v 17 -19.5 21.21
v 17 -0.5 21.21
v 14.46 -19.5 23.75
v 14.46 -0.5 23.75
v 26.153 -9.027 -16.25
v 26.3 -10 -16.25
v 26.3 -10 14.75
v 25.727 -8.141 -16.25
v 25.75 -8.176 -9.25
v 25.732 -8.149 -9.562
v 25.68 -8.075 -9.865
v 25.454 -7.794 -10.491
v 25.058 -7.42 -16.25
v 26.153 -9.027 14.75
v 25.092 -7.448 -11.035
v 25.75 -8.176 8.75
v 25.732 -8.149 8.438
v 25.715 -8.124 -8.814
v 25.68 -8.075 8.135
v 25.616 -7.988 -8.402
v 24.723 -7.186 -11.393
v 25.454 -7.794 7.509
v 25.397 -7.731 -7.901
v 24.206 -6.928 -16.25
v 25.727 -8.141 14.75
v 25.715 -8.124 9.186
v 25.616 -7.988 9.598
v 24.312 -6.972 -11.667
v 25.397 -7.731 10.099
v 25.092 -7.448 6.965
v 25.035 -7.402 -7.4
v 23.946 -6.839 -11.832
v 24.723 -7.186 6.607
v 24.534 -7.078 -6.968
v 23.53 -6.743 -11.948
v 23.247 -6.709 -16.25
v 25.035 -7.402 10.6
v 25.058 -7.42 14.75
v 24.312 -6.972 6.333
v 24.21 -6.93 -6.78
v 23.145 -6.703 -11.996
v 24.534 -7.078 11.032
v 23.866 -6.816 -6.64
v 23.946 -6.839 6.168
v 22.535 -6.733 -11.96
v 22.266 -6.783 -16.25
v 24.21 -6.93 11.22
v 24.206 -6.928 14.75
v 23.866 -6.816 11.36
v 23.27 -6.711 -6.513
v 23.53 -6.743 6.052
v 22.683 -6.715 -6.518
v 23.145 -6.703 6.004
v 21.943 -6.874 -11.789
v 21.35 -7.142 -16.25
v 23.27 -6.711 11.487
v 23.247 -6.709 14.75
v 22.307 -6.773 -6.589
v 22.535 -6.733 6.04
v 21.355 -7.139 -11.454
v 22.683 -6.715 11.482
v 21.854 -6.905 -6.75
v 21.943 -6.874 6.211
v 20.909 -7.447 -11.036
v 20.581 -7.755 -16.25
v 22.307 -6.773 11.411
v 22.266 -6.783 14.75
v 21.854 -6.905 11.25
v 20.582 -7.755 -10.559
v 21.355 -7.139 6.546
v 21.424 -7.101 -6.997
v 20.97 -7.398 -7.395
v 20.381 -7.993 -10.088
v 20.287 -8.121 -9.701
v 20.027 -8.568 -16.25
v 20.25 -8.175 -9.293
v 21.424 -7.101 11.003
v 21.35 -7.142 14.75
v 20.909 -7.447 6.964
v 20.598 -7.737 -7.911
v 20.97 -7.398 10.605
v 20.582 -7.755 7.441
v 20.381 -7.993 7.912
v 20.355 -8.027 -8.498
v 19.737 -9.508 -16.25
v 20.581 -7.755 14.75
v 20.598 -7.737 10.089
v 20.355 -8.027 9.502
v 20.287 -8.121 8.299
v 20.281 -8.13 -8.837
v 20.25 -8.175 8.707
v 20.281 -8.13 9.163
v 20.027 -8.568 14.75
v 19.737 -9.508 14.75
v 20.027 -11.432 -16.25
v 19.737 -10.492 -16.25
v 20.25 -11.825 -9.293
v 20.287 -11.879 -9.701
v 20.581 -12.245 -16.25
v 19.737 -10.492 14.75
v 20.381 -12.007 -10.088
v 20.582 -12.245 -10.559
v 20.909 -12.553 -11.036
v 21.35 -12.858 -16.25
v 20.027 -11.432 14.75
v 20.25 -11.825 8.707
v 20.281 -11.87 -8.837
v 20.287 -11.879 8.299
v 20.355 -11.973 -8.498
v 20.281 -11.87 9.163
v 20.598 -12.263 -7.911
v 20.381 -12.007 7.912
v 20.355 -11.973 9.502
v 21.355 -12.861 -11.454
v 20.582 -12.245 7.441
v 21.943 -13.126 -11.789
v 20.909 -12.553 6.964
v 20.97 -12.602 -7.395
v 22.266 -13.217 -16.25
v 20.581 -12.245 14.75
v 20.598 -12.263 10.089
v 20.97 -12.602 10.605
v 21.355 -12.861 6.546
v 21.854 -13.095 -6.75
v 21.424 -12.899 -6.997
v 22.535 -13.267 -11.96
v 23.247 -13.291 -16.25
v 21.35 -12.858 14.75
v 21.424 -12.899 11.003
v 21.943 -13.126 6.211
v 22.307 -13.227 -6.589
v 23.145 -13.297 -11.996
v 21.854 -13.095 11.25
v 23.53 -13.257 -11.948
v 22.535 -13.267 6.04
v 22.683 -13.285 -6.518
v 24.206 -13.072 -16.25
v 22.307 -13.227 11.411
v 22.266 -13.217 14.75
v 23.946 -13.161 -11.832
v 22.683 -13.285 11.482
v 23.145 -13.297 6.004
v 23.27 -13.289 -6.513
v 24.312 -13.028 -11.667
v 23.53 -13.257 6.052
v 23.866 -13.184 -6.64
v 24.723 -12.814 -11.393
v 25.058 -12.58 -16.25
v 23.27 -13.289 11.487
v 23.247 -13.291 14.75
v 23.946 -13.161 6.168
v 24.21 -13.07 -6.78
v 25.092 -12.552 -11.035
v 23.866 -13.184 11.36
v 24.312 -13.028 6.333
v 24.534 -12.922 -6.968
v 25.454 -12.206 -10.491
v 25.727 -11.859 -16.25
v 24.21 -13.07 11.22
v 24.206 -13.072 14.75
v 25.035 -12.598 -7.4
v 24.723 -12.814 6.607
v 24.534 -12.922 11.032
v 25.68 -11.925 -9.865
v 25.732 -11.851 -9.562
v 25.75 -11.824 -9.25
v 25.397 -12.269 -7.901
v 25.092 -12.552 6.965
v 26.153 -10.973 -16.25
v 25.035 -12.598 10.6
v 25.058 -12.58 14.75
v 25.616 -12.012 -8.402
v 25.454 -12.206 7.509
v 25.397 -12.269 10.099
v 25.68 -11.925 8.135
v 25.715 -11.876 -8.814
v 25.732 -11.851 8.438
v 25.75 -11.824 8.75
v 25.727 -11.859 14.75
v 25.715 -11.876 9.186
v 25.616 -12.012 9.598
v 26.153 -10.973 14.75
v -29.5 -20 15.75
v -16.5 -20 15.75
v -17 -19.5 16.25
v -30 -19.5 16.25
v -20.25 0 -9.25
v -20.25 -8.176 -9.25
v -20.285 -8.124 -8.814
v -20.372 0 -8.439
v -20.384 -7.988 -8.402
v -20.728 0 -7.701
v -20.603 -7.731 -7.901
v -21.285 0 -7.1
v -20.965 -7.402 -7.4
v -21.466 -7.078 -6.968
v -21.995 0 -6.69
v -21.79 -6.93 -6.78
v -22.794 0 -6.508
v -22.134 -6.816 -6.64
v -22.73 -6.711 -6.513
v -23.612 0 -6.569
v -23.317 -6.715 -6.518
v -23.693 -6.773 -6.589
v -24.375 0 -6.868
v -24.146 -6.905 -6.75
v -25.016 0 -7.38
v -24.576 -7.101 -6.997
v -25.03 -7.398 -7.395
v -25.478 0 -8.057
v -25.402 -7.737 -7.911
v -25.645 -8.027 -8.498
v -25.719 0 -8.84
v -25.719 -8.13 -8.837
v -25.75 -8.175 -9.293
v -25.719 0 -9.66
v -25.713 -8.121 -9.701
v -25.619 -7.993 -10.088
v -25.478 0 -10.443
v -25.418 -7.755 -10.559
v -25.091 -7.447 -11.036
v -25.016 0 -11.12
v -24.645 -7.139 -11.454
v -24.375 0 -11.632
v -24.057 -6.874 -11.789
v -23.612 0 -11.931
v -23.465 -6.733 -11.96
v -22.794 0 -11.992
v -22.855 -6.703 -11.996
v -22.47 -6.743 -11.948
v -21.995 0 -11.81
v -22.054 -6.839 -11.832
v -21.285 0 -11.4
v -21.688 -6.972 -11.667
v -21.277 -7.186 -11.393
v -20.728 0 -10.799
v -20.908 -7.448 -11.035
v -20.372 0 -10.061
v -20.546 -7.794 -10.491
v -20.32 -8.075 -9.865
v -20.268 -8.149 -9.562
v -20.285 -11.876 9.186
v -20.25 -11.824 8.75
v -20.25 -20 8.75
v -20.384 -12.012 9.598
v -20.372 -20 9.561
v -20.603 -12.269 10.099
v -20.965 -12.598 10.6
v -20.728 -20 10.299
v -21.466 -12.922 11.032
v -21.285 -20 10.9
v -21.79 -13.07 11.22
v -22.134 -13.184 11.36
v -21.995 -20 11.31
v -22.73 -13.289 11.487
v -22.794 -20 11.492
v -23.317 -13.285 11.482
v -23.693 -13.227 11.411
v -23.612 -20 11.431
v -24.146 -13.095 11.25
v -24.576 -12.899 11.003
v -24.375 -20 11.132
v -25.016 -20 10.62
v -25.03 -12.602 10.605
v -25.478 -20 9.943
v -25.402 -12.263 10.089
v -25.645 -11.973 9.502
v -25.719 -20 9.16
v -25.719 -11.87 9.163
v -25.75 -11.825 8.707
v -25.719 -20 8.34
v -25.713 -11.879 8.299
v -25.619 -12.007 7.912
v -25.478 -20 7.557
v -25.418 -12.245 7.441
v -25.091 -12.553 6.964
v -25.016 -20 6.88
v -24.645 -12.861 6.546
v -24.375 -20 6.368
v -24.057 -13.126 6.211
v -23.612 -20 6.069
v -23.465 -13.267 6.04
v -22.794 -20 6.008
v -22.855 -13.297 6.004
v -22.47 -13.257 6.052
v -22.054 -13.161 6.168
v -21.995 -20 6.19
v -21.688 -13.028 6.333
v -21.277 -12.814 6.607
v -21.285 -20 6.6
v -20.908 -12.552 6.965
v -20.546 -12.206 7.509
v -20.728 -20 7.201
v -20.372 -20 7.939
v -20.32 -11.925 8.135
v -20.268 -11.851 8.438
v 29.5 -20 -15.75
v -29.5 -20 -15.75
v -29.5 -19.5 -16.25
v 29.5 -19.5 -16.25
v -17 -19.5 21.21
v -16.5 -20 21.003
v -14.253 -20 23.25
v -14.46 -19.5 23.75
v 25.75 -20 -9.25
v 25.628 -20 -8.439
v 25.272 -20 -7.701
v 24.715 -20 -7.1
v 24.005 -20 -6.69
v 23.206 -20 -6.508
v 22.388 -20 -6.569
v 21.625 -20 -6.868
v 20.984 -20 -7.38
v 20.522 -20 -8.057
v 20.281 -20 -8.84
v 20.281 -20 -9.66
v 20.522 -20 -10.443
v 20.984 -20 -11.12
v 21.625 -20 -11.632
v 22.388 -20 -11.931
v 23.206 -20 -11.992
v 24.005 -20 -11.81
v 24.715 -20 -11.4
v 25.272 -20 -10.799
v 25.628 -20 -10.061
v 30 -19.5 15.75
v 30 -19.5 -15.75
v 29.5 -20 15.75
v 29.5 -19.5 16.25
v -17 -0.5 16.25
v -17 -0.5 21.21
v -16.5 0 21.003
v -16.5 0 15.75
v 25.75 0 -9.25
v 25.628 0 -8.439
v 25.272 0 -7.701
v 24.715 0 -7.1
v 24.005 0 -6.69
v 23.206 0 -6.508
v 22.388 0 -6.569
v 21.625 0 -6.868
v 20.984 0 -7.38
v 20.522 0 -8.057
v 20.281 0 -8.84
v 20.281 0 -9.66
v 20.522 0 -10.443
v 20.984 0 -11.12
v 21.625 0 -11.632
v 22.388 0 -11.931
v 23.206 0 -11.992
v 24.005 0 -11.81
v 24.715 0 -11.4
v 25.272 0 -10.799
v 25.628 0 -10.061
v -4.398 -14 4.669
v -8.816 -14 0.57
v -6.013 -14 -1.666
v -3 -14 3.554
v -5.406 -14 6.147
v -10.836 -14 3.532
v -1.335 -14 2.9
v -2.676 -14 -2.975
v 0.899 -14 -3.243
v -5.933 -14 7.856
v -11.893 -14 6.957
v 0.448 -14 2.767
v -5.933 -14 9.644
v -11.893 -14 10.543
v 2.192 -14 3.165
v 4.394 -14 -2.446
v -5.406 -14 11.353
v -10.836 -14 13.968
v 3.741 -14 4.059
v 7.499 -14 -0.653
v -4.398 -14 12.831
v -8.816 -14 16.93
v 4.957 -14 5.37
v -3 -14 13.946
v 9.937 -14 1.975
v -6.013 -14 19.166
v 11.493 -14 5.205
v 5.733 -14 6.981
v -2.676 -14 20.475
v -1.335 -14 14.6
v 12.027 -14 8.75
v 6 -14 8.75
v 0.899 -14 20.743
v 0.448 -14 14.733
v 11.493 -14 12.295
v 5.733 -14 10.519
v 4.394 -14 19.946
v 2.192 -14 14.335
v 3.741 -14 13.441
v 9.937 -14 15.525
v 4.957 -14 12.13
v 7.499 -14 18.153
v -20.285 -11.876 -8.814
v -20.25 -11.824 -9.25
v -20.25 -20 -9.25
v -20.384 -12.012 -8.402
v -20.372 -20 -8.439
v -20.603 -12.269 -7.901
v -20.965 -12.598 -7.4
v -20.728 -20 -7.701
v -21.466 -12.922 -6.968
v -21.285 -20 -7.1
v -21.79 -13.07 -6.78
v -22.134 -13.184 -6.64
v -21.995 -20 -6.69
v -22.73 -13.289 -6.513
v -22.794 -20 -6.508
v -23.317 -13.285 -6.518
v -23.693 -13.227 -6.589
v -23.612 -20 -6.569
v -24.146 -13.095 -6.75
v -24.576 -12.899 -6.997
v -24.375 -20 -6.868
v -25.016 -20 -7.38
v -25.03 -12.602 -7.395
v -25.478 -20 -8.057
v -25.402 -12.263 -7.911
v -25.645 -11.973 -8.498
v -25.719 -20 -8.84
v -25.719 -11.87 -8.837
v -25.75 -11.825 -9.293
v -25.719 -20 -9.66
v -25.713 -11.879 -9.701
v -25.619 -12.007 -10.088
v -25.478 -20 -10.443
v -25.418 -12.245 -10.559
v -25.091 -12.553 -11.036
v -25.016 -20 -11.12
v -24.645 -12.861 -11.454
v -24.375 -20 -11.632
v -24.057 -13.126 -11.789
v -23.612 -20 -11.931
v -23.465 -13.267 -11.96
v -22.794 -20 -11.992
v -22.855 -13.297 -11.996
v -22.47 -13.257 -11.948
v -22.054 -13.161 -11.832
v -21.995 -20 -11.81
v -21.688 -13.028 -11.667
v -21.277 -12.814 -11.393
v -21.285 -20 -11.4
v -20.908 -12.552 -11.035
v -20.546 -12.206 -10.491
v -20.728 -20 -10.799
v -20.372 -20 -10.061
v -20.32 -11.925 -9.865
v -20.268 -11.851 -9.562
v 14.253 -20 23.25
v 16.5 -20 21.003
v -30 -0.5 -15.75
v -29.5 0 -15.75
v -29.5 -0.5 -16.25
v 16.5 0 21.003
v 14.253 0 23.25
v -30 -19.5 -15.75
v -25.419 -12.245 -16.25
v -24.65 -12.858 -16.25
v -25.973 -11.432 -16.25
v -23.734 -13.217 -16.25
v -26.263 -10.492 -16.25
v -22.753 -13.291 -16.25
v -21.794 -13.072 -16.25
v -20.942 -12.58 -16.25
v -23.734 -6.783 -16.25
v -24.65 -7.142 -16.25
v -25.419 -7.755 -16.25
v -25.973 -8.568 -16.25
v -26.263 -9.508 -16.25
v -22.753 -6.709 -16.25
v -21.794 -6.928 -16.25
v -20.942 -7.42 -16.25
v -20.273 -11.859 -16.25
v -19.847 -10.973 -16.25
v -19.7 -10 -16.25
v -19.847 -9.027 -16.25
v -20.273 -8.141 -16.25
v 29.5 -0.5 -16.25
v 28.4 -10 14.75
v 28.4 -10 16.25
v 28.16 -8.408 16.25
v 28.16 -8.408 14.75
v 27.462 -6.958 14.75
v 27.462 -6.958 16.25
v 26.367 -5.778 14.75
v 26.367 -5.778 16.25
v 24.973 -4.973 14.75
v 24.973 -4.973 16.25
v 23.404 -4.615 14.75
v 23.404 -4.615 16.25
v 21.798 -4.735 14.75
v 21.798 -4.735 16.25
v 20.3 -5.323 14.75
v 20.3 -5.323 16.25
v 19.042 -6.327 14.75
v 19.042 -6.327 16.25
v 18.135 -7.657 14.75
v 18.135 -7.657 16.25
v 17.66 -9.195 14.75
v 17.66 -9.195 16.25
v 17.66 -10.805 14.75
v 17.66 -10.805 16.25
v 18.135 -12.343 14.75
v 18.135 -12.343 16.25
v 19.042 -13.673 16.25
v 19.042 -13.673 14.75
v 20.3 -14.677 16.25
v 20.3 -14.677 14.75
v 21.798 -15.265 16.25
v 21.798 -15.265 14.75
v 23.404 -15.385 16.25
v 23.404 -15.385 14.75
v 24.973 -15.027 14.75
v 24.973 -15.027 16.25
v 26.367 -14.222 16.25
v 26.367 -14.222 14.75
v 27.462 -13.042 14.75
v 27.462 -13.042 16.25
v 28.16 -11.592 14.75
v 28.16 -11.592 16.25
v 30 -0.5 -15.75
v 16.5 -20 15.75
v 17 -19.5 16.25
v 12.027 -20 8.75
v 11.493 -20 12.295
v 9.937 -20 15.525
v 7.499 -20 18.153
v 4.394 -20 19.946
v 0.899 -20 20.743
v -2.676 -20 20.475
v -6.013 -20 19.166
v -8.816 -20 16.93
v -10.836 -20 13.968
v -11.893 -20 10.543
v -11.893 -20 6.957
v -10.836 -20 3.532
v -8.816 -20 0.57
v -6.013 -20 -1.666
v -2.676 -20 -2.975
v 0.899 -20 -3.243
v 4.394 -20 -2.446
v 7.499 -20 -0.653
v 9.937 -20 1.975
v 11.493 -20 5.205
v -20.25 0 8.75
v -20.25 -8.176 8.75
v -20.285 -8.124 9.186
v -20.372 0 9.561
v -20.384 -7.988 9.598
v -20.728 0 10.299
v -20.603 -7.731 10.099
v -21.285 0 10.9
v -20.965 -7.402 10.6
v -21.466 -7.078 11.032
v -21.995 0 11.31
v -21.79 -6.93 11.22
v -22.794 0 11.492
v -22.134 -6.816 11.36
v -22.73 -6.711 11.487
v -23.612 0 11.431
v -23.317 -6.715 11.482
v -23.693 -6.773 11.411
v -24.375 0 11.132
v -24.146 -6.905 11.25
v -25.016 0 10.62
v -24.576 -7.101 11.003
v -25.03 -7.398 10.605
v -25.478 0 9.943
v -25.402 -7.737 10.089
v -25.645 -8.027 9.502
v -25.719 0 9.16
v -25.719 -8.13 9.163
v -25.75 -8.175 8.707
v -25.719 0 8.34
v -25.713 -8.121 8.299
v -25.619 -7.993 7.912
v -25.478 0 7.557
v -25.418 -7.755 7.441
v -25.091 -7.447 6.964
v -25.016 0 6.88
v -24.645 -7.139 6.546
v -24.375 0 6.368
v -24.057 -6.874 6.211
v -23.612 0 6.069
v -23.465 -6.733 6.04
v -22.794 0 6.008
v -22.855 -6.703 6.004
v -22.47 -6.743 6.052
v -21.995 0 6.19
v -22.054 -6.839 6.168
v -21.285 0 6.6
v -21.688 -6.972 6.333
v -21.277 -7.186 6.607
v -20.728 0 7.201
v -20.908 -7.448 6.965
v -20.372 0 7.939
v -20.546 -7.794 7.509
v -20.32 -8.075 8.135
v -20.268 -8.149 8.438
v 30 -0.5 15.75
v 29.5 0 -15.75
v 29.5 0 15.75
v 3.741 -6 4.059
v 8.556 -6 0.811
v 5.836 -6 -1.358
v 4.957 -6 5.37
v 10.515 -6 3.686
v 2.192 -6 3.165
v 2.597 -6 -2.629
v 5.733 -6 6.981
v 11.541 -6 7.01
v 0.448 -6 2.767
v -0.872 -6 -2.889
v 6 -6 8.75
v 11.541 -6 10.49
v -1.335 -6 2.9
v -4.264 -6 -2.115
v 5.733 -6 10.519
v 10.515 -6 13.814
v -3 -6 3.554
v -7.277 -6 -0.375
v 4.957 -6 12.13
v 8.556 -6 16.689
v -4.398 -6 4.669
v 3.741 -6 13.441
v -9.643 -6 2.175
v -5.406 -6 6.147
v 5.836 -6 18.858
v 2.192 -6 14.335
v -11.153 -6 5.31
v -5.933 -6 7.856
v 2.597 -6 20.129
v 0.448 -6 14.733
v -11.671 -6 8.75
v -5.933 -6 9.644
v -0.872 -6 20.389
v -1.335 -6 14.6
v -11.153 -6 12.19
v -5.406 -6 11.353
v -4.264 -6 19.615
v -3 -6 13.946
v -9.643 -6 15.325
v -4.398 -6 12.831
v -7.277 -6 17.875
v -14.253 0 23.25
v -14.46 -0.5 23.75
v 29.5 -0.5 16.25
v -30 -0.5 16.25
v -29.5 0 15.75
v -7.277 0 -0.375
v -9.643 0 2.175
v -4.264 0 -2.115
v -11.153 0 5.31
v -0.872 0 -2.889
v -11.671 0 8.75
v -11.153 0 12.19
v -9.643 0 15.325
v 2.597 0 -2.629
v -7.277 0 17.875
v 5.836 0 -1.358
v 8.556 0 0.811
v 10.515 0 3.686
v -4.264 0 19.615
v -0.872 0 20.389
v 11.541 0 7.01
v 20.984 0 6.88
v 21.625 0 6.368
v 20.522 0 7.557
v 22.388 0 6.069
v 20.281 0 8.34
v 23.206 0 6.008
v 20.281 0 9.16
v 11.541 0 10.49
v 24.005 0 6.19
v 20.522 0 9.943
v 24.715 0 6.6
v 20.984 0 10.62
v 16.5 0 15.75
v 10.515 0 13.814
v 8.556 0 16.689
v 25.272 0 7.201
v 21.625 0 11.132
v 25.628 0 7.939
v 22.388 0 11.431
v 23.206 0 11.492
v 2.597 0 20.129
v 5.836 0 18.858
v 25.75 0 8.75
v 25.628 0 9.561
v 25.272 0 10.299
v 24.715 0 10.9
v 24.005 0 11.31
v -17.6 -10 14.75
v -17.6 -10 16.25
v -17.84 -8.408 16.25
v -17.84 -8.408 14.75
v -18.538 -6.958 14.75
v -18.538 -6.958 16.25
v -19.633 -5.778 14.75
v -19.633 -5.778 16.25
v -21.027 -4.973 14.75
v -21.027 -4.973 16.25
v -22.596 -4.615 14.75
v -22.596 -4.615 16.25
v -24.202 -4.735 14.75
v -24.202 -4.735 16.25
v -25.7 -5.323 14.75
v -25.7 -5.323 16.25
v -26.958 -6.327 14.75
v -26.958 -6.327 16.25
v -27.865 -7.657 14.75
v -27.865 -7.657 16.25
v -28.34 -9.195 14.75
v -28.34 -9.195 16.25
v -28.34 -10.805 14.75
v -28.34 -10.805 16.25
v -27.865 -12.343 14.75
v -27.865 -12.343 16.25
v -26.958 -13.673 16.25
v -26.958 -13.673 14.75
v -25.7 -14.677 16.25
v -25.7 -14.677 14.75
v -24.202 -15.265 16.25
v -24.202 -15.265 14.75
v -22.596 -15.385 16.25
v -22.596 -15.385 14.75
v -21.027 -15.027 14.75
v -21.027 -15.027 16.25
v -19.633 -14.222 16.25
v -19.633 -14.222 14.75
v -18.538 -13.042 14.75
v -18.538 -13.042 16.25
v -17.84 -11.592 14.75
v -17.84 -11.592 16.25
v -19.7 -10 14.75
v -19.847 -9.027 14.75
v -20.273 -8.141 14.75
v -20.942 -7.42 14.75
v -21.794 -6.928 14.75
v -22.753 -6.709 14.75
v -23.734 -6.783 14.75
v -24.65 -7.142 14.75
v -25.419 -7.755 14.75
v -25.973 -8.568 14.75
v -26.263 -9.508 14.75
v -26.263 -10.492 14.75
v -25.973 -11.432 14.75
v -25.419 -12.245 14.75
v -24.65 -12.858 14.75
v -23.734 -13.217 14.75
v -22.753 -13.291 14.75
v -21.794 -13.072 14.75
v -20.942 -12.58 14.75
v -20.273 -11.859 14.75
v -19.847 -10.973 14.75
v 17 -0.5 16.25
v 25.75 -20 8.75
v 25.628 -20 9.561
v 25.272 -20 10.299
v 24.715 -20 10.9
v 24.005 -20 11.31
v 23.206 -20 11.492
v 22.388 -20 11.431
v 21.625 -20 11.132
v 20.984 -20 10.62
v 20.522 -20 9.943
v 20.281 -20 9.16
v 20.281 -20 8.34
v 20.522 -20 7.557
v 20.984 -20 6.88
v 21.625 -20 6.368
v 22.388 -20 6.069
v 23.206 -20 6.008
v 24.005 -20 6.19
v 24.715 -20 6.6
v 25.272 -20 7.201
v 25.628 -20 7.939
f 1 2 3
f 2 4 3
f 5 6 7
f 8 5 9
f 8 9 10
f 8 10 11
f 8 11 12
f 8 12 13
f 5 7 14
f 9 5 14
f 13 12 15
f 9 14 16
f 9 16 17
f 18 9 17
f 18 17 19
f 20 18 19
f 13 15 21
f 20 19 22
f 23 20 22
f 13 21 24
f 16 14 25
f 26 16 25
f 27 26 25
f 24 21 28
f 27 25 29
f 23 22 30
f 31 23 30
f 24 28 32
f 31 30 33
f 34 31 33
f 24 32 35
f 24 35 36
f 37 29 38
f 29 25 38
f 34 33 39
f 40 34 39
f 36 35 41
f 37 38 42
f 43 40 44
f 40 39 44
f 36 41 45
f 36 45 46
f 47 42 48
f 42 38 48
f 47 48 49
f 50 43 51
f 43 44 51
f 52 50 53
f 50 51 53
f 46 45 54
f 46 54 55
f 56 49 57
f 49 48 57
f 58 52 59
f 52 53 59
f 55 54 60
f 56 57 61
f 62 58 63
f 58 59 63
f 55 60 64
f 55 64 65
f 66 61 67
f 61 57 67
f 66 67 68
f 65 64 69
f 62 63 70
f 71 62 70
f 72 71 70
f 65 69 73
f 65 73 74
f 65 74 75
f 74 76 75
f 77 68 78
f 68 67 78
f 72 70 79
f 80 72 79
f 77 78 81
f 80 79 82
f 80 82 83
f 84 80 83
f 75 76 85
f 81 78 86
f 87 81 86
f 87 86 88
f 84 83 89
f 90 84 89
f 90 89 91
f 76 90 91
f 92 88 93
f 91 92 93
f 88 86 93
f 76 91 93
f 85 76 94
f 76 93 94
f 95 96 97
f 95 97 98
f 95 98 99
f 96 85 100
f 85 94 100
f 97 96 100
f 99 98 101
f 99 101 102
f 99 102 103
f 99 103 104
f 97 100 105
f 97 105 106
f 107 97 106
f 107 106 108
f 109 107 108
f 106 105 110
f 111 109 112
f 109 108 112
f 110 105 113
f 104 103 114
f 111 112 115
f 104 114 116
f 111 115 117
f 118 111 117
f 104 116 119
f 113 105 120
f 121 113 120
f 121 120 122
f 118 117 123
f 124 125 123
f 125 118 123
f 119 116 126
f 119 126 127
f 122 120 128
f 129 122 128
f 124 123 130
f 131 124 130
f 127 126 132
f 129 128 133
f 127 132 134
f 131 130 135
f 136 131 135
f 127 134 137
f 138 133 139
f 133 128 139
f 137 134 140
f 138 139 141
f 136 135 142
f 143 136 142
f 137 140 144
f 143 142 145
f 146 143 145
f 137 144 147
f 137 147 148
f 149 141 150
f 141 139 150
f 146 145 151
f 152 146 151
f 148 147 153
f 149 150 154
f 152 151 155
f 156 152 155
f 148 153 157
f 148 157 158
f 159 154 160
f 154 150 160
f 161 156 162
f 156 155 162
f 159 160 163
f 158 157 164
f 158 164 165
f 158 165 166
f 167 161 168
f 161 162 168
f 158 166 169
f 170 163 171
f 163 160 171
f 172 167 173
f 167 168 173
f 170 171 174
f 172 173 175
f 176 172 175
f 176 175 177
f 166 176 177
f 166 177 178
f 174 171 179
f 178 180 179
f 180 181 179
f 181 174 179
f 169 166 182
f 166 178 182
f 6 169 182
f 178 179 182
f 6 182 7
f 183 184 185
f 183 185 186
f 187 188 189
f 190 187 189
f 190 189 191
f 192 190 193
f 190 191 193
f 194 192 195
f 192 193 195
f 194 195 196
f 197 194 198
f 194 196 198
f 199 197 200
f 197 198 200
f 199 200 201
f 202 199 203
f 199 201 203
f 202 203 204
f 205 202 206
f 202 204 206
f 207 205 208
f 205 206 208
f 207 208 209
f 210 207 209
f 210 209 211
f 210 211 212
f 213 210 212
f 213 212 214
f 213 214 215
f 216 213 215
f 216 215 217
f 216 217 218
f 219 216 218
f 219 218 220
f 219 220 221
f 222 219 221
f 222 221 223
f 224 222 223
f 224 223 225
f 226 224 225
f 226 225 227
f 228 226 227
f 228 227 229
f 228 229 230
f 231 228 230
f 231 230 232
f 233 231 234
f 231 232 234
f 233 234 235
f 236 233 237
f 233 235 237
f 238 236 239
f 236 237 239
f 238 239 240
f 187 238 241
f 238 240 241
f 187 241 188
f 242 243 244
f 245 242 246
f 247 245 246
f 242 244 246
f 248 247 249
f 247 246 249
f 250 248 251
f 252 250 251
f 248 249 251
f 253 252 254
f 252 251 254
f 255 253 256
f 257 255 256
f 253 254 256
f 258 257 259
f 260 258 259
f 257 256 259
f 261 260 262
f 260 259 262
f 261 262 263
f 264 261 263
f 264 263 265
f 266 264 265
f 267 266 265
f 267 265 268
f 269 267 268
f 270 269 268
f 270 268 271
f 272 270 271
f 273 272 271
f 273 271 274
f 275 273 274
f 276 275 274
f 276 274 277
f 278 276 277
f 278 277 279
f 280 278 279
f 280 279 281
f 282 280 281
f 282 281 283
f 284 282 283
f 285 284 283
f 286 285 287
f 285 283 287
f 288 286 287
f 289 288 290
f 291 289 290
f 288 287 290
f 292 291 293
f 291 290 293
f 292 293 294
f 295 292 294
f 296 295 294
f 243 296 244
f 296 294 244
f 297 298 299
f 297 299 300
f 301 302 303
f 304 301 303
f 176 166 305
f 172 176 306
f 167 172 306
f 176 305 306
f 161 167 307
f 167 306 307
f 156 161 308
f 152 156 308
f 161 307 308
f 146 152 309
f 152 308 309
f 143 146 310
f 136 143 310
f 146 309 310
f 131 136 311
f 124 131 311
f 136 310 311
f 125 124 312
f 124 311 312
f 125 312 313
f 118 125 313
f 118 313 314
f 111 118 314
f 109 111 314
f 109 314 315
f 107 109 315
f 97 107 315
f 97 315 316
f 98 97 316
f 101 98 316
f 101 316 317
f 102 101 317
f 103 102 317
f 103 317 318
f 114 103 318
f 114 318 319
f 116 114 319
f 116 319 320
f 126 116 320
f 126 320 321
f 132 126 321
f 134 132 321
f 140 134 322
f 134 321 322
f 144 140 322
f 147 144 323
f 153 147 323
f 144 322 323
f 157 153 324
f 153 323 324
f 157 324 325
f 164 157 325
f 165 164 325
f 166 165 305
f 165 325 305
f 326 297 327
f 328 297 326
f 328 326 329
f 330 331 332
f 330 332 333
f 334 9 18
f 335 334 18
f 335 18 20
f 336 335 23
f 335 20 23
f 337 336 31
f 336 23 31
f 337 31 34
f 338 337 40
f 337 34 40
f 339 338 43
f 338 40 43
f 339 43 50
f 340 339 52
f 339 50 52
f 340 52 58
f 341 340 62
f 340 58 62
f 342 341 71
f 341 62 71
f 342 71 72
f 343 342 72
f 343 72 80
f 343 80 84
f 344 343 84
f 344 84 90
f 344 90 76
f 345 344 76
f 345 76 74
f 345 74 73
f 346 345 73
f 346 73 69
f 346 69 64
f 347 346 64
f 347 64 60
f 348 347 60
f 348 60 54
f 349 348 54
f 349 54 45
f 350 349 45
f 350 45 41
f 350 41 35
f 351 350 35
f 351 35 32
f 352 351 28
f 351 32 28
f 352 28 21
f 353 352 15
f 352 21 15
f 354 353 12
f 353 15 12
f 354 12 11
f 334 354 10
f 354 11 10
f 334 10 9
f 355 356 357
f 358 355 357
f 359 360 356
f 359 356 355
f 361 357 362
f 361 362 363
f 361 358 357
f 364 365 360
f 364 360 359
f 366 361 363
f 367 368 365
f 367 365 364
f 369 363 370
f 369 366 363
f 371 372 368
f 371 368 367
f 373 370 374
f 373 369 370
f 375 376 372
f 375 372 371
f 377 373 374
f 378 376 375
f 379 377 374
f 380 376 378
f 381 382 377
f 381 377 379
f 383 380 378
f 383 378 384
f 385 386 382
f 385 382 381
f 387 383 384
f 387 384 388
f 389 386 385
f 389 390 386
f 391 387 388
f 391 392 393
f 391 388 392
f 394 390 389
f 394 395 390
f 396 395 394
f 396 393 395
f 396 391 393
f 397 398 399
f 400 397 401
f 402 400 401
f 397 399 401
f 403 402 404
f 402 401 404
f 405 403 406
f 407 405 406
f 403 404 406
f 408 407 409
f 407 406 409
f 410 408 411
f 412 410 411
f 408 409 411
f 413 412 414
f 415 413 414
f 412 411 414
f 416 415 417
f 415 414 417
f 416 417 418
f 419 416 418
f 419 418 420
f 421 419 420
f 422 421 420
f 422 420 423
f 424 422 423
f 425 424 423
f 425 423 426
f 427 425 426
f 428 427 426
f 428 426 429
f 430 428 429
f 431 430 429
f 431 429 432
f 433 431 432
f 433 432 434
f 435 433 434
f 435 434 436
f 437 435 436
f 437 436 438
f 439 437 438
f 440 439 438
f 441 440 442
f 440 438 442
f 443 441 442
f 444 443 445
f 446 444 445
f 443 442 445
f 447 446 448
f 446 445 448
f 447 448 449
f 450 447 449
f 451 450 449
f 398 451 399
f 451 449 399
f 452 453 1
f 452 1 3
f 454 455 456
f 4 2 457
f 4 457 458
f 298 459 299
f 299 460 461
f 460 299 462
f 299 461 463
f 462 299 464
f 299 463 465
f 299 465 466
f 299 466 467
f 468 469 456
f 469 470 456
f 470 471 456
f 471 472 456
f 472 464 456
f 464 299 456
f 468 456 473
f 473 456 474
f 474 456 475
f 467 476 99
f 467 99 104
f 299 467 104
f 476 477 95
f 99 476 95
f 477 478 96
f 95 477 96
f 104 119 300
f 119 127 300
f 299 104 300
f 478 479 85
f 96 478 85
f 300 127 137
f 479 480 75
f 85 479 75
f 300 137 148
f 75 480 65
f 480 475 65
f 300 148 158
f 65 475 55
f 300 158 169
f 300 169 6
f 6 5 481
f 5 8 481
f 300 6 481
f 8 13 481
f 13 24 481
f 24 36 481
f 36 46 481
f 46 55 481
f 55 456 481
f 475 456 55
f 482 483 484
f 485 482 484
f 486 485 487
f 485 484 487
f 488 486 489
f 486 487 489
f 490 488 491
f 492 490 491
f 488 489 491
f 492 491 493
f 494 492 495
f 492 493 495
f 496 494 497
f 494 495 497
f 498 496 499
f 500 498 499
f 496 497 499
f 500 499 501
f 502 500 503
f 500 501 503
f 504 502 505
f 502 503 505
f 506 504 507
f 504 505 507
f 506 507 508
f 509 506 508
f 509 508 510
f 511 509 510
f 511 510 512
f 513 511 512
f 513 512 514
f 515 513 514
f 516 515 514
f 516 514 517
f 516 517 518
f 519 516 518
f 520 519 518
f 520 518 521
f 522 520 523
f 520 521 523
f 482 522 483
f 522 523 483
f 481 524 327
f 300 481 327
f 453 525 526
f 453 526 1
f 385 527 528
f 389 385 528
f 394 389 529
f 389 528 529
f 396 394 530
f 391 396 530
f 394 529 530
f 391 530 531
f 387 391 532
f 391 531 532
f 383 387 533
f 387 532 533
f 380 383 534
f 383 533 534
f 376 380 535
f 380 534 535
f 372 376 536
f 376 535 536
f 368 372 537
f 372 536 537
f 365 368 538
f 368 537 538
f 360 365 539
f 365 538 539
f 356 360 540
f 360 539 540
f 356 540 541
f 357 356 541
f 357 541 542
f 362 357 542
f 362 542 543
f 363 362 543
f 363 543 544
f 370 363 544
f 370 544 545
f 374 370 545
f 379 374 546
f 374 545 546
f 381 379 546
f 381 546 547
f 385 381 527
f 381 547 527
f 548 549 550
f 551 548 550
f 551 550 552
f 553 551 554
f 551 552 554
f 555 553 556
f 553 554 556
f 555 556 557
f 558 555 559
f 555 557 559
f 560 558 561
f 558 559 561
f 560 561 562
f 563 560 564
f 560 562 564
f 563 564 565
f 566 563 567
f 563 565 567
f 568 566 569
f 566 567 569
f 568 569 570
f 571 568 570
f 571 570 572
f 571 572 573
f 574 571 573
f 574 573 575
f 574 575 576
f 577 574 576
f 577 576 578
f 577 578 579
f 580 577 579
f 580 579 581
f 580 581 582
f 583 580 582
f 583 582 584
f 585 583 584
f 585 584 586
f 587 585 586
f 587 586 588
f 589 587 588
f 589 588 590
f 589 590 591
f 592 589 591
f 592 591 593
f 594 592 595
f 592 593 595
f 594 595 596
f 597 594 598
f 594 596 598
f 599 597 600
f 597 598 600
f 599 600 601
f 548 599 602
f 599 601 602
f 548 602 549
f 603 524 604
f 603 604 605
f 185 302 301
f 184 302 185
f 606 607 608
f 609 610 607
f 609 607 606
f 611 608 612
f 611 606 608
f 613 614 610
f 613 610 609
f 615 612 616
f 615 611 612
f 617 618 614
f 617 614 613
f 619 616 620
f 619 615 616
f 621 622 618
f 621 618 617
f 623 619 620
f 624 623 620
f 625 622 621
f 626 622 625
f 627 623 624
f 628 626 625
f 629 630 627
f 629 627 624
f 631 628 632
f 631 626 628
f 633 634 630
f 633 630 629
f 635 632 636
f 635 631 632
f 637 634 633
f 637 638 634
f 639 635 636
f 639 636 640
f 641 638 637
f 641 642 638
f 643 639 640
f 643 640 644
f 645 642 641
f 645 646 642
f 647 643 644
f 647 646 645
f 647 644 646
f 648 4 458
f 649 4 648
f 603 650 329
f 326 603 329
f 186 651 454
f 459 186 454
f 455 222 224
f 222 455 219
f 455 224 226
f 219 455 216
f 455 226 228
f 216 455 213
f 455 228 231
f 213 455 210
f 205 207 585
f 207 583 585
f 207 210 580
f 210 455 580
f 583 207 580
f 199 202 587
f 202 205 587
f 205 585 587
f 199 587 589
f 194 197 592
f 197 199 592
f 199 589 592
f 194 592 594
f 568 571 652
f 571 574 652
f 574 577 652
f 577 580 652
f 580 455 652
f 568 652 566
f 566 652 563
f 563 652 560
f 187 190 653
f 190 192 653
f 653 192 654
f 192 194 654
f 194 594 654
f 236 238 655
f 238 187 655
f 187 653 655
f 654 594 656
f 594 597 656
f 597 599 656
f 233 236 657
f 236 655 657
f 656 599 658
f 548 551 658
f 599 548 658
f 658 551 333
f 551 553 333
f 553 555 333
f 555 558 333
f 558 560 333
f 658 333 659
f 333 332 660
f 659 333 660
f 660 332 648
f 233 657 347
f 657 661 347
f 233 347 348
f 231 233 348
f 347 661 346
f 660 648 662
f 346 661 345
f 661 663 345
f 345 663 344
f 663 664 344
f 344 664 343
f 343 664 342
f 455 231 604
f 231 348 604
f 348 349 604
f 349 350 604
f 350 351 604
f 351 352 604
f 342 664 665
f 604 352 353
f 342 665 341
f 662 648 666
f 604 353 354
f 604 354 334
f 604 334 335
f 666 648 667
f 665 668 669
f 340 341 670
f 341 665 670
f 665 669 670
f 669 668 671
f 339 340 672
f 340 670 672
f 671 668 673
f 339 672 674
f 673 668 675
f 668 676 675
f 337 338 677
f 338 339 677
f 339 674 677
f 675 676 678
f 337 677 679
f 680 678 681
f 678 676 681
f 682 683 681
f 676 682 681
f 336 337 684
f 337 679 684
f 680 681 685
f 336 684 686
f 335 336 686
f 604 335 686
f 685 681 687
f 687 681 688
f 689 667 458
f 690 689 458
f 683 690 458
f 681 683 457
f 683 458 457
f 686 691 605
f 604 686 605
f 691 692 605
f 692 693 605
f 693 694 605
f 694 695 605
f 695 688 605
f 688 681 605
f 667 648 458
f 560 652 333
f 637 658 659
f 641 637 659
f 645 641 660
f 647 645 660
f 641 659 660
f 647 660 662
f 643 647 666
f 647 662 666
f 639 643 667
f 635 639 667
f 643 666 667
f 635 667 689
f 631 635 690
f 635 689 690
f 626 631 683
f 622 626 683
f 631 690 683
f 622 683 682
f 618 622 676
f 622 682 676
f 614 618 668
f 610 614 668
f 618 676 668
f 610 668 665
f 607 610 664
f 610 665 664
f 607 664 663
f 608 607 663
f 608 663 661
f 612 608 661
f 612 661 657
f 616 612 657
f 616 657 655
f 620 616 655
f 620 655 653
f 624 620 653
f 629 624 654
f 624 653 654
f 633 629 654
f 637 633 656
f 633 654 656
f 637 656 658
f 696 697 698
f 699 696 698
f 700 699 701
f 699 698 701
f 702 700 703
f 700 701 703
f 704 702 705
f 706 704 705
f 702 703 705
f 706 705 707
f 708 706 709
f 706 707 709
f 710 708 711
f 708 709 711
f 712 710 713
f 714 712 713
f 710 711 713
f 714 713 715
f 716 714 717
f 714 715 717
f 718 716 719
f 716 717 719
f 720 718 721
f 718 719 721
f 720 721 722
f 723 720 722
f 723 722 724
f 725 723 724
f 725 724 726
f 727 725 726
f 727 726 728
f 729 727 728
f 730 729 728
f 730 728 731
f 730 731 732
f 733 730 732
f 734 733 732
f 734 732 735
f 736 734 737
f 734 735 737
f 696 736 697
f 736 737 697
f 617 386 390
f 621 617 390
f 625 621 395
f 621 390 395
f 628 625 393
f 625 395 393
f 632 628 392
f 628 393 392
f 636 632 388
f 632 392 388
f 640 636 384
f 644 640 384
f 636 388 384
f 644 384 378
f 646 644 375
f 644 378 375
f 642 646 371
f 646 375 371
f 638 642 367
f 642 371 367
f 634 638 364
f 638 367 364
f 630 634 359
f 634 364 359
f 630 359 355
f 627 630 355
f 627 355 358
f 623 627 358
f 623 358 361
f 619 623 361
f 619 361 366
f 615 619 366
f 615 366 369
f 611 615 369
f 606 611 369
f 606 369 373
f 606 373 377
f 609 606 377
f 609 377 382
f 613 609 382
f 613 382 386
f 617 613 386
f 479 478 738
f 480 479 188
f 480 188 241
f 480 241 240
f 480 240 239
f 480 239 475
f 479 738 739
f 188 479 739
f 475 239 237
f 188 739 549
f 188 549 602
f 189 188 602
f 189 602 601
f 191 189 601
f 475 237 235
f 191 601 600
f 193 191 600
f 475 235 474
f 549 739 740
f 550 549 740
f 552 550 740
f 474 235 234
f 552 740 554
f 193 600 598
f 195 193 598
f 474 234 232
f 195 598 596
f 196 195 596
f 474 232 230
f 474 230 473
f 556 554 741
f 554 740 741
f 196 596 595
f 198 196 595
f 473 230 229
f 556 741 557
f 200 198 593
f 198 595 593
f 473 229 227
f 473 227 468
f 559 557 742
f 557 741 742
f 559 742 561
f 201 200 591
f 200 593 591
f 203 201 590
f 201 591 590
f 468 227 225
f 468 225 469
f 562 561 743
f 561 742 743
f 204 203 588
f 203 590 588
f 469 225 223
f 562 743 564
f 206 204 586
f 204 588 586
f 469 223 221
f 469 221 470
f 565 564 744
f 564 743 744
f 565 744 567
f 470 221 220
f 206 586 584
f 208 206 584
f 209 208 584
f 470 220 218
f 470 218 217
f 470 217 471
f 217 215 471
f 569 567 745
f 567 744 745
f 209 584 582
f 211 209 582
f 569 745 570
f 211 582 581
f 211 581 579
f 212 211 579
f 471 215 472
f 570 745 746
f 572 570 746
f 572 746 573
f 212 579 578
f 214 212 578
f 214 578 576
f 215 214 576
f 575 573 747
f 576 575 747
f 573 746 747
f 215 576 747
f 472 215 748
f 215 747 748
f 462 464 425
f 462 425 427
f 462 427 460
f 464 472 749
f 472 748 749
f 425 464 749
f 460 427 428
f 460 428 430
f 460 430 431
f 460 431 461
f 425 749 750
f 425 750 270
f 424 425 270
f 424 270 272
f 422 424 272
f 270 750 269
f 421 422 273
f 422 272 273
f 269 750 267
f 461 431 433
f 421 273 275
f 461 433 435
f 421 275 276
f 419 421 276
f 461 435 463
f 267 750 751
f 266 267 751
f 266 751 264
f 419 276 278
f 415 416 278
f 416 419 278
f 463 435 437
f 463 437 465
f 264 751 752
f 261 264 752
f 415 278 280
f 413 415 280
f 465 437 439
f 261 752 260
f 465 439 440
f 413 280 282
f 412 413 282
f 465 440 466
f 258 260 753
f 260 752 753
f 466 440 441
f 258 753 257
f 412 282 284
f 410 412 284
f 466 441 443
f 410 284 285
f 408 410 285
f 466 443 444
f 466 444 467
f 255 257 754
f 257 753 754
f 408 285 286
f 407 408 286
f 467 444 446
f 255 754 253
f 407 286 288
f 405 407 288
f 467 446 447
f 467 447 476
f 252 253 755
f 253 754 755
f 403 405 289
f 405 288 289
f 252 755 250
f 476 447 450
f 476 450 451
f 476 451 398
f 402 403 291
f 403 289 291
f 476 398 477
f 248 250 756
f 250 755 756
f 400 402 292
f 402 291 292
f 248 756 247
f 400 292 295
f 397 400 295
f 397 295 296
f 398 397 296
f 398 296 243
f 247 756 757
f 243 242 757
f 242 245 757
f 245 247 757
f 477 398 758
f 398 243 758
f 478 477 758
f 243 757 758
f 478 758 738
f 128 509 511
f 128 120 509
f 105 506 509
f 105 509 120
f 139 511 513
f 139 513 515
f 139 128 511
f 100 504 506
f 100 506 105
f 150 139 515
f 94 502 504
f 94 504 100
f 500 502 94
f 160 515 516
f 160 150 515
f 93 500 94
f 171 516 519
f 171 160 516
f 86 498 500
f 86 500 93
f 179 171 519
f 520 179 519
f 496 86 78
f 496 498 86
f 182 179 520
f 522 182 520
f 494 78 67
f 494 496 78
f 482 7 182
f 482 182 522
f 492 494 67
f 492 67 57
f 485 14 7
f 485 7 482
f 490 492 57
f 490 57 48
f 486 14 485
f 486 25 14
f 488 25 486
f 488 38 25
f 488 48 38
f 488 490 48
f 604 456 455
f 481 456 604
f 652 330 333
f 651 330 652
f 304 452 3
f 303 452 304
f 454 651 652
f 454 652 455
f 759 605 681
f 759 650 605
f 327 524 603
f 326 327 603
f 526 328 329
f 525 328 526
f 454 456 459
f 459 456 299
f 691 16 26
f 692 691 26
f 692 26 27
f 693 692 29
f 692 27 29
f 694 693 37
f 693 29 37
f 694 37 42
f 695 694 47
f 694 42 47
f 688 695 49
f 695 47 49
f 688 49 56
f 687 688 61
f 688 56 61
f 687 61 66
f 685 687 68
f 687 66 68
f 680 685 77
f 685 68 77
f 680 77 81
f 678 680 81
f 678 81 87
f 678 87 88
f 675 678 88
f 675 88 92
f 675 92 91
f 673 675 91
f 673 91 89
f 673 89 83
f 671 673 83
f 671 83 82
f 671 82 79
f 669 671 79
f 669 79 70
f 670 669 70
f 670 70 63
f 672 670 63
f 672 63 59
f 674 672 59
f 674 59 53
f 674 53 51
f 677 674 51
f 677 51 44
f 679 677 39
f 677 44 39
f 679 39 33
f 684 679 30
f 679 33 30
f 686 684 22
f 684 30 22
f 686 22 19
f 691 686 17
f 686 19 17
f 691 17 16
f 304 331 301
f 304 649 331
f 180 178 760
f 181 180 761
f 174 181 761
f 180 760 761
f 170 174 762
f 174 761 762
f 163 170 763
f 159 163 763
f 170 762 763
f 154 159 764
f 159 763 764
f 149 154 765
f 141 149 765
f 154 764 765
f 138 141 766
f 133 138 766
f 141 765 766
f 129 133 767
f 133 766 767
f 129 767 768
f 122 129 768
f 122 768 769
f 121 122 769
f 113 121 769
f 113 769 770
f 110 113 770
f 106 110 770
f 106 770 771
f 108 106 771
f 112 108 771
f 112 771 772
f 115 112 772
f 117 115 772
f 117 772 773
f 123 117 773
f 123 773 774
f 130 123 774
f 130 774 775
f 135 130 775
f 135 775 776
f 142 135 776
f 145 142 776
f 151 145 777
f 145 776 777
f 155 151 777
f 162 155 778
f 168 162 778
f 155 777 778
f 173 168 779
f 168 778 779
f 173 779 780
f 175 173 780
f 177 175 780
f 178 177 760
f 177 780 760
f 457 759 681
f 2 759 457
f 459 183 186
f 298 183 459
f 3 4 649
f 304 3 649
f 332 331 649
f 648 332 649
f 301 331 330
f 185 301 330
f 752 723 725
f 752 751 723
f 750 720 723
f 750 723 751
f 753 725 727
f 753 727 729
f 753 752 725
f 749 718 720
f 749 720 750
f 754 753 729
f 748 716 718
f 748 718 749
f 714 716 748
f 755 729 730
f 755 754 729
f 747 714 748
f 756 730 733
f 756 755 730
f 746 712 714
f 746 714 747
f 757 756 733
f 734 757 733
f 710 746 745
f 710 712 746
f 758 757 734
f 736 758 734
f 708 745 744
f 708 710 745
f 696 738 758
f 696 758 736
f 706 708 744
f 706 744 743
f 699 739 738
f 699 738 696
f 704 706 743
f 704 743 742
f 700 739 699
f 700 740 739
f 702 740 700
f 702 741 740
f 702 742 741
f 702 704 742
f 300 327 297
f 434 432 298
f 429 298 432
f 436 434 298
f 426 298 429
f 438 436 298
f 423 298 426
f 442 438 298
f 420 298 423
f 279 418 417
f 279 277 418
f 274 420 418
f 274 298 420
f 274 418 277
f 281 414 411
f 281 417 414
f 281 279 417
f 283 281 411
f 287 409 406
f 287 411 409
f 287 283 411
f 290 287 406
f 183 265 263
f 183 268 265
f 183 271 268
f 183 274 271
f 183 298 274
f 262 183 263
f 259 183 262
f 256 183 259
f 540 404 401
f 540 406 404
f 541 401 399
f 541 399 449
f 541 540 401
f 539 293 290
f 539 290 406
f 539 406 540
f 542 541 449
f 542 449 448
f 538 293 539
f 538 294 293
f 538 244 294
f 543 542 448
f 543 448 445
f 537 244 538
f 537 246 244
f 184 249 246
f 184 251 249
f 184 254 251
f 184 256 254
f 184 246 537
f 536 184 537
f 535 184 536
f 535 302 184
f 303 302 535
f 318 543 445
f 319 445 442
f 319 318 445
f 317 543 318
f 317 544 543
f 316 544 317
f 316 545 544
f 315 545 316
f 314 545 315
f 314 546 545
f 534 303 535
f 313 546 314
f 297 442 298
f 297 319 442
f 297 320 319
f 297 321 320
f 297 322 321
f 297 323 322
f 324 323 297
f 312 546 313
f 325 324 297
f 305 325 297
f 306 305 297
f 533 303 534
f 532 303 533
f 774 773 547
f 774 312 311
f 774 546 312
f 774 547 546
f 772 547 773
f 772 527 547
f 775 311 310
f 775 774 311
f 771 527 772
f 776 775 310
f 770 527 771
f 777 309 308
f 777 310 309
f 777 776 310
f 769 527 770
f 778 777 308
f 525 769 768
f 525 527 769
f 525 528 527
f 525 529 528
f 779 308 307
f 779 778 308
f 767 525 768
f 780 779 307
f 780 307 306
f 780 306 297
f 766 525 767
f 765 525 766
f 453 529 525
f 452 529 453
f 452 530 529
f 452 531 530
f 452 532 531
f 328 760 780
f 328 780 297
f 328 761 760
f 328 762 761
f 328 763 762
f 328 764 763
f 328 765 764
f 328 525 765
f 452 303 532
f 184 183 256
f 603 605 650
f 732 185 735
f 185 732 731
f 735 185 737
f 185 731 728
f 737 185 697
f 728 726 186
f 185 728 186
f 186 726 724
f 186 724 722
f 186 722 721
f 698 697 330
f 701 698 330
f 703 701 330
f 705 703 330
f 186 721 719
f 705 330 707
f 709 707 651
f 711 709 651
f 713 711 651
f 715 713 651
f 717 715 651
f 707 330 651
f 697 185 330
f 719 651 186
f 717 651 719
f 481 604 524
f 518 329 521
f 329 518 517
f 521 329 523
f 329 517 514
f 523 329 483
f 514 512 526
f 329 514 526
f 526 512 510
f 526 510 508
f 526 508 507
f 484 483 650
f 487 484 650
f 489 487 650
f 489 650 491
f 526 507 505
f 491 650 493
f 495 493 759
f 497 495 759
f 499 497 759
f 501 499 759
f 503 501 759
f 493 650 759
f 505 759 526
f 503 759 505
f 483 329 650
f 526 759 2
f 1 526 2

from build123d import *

# Parameters (mm, degrees)
F1_DEPTH  = 20
F2_R      = 6
F2_R_2    = 2.75
F3_DEPTH  = 20.001
F4_R      = 5.4
F5_DEPTH  = 1.5
F6_R      = 3.3
F7_DEPTH  = 31.001
F8_R      = 12.0269
F9_DEPTH  = 6
F10_R     = 11.6713
F11_DEPTH = 6
F12_SIZE  = 2.54
F13_SIZE  = 0.5


with BuildPart() as f1:
    # F0 (on Front) → F1 (new body)
    with BuildSketch(Plane.XZ):
        Polygon((-30, -16.25), (30, -16.25), (30, 16.25), (17, 16.25), (17, 23.75), (-17, 23.75), (-17, 16.25), (-30, 16.25), align=None)
    extrude(amount=F1_DEPTH)

    # F2 (on face) → F3 (cut, through all)
    with BuildSketch(Plane.XZ.offset(20)):
        with Locations((0, 8.75)):
            Circle(F2_R)
        with Locations((-23, 8.75)):
            Circle(F2_R_2)
        with Locations((-23, -9.25)):
            Circle(F2_R_2)
        with Locations((23, 8.75)):
            Circle(F2_R_2)
        with Locations((23, -9.25)):
            Circle(F2_R_2)
    extrude(amount=-F3_DEPTH, mode=Mode.SUBTRACT)

    # F4 (on face) → F5 (cut)
    with BuildSketch(Plane.XY.offset(16.25)):
        with Locations((-23, -10)):
            Circle(F4_R)
        with Locations((23, -10)):
            Circle(F4_R)
    extrude(amount=-F5_DEPTH, mode=Mode.SUBTRACT)

    # F6 (on face) → F7 (cut, through all)
    with BuildSketch(Plane.XY.offset(14.75)):
        with Locations((-23, -10)):
            Circle(F6_R)
        with Locations((23, -10)):
            Circle(F6_R)
    extrude(amount=-F7_DEPTH, mode=Mode.SUBTRACT)

    # F8 (on face) → F9 (cut)
    with BuildSketch(Plane.XZ.offset(20)):
        with Locations((0, 8.75)):
            Circle(F8_R)
    extrude(amount=-F9_DEPTH, mode=Mode.SUBTRACT)

    # F10 (on face) → F11 (cut)
    with BuildSketch(Plane(origin=(0, 0, 0), x_dir=(-1, 0, 0), z_dir=(0, 1, 0))):
        with Locations((0, 8.75)):
            Circle(F10_R)
    extrude(amount=-F11_DEPTH, mode=Mode.SUBTRACT)

    # F12
    f12_edges = [f1.edges().sort_by_distance(p)[0] for p in [
        (17, -10, 23.75),
        (-17, -10, 23.75),
    ]]
    chamfer(f12_edges, length=F12_SIZE)

    # F13
    f13_edges = [f1.edges().sort_by_distance(p)[0] for p in [
        (23.5, 0, 16.25),
        (17, 0, 18.73),
        (15.73, 0, 22.48),
        (0, 0, 23.75),
        (-15.73, 0, 22.48),
        (-17, 0, 18.73),
        (-23.5, 0, 16.25),
        (-30, 0, 0),
        (0, 0, -16.25),
        (30, 0, 0),
        (30, -10, 16.25),
        (30, -20, 0),
        (30, -10, -16.25),
        (23.5, -20, 16.25),
        (17, -20, 18.73),
        (15.73, -20, 22.48),
        (0, -20, 23.75),
        (-15.73, -20, 22.48),
        (-17, -20, 18.73),
        (-23.5, -20, 16.25),
        (-30, -20, 0),
        (-30, -10, -16.25),
        (0, -20, -16.25),
    ]]
    chamfer(f13_edges, length=F13_SIZE)


solid = f1.part
